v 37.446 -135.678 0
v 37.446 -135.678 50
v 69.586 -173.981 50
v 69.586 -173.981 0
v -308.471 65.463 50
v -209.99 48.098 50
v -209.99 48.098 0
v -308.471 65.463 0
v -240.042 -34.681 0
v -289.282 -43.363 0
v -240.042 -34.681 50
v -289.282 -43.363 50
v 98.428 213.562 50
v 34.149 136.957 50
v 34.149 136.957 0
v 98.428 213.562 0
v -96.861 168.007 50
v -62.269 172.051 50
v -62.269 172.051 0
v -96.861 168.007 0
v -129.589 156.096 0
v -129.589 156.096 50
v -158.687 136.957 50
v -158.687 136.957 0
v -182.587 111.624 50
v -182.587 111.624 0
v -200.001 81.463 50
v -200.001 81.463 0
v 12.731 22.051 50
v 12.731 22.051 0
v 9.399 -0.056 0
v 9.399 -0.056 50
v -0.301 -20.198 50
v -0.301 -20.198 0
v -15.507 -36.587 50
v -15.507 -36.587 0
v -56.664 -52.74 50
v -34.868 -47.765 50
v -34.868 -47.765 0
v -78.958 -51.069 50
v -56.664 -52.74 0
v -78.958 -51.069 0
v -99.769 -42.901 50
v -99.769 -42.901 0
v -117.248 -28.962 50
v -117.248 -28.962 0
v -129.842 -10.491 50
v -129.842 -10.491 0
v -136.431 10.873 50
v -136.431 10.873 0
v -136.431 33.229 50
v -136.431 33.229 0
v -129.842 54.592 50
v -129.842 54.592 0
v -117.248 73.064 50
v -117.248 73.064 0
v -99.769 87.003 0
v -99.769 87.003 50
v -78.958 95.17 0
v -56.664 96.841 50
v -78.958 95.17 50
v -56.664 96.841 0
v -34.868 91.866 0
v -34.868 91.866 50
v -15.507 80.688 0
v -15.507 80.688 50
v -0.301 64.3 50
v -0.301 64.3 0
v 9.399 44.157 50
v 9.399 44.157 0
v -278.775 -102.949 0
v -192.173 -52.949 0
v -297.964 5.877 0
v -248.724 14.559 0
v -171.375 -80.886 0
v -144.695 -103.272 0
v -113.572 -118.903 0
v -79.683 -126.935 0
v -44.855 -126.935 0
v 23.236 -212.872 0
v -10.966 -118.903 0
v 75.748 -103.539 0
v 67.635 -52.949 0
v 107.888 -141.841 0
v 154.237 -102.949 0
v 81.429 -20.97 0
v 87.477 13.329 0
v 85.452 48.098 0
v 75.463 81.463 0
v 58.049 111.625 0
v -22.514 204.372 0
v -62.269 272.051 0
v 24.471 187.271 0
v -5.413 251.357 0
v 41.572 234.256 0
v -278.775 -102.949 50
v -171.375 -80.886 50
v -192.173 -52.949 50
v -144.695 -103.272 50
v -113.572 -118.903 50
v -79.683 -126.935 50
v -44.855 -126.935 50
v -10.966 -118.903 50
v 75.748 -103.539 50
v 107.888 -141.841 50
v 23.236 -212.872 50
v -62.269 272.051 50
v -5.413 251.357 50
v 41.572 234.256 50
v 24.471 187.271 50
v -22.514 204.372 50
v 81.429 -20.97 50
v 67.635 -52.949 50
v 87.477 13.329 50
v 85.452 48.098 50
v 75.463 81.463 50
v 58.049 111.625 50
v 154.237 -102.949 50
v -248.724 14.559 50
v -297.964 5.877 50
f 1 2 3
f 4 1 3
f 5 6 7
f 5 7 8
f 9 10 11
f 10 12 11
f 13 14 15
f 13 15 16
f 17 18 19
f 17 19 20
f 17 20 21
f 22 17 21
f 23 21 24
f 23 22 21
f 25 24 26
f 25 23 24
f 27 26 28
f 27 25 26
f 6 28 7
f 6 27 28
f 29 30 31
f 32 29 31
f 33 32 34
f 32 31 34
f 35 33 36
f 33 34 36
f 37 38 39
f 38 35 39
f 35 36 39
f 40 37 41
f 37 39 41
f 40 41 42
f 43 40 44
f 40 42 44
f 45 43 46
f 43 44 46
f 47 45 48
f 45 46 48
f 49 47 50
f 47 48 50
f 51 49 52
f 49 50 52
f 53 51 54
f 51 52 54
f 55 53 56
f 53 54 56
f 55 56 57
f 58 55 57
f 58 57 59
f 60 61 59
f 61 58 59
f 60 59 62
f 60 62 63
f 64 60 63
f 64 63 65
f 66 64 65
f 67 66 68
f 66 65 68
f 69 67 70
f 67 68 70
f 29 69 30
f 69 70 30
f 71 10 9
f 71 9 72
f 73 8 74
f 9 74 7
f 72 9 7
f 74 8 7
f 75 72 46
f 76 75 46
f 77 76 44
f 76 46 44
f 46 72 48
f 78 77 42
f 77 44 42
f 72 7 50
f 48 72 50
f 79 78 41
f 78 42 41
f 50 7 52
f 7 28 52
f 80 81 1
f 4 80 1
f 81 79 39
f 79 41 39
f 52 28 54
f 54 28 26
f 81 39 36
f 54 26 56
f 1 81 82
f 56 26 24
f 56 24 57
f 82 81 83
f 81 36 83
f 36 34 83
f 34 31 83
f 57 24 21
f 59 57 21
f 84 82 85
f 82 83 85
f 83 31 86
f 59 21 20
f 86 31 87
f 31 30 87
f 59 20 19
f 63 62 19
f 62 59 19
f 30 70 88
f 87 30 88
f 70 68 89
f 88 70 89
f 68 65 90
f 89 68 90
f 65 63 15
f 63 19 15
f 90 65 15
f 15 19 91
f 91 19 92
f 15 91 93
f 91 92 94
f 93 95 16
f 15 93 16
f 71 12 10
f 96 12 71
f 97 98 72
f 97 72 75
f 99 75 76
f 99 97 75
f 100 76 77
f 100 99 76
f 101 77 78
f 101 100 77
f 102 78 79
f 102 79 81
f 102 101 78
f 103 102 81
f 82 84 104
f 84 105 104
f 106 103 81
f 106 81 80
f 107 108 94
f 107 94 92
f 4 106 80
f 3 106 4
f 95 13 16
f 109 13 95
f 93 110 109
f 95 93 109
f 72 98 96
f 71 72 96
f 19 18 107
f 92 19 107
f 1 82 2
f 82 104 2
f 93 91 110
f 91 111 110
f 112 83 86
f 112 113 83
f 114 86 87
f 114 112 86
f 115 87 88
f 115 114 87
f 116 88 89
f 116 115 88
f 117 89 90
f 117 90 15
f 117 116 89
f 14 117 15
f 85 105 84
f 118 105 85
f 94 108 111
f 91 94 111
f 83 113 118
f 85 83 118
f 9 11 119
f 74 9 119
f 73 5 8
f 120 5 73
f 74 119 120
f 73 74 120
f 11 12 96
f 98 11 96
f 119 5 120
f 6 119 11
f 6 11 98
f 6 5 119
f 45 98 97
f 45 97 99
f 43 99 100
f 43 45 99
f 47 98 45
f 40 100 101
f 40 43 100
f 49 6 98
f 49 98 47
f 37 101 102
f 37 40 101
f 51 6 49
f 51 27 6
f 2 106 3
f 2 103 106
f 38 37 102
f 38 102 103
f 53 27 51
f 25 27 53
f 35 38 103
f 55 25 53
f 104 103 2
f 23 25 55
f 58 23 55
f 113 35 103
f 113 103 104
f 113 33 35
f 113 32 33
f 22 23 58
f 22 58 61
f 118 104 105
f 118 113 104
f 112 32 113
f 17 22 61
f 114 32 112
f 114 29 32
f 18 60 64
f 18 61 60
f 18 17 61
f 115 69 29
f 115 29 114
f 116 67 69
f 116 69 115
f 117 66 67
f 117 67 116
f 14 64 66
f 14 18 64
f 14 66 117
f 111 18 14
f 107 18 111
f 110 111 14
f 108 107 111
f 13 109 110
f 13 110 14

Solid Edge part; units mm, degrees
sketch "Sketch1" plane through (0, 0, 0) normal (0, 0, 1) x (1, 0, 0)
  circle A0 centre (-62.269, 22.0507) radius 250
  circle A1 centre (-62.269, 22.0507) radius 75
extrude "Protrusion1" add sketch "Sketch1" along normal blind 50
sketch "Sketch2" plane through (-62.269, 22.0507, 50) normal (0, 0, 1) x (0, 1, 0)
  arc A0 (150, 0) -> (26.0472, 147.7212) centre (0, 0) ccw
  line L0 (26.0472, 147.7212) -> (52.0945, 295.4423)
  line L1 (52.0945, 295.4423) -> (379.3774, 186.8257)
  line L2 (379.3774, 186.8257) -> (365.0673, 0)
  line L3 (150, 0) -> (365.0673, 0)
extrude "Cutout1" cut sketch "Sketch2" against normal through all
sketch "Sketch3" plane through (-69.8074, 22.0507, 50) normal (0, 0, 1) x (0, 1, 0)
  line L0 (43.412, 238.6635) -> (-252.0303, 186.5691)
  line L1 (-252.0303, 186.5691) -> (-35.9633, 306.8202)
  line L2 (-35.9633, 306.8202) -> (43.412, 238.6635)
extrude "Cutout2" cut sketch "Sketch3" against normal through all
sketch "Sketch4" plane through (-77.1168, 29.5891, 50) normal (0, 0, 1) x (0.9396926, -0.3420201, 0)
  line L0 (-8.4693, 182.9176) -> (41.5307, 182.9176)
  line L1 (41.5307, 182.9176) -> (41.5307, 232.9176)
  line L2 (41.5307, 232.9176) -> (-8.4693, 232.9176)
  line L3 (-8.4693, 232.9176) -> (-8.4693, 182.9176)
  dimension "D1" = 50
extrude "Cutout3" cut sketch "Sketch4" against normal through all
pattern_circular "Pattern1" count 3 over 360 about axis through (-62.269, 22.0507, 50) along (0, 0, -1) of "Cutout1", "Cutout3", "Cutout2"
